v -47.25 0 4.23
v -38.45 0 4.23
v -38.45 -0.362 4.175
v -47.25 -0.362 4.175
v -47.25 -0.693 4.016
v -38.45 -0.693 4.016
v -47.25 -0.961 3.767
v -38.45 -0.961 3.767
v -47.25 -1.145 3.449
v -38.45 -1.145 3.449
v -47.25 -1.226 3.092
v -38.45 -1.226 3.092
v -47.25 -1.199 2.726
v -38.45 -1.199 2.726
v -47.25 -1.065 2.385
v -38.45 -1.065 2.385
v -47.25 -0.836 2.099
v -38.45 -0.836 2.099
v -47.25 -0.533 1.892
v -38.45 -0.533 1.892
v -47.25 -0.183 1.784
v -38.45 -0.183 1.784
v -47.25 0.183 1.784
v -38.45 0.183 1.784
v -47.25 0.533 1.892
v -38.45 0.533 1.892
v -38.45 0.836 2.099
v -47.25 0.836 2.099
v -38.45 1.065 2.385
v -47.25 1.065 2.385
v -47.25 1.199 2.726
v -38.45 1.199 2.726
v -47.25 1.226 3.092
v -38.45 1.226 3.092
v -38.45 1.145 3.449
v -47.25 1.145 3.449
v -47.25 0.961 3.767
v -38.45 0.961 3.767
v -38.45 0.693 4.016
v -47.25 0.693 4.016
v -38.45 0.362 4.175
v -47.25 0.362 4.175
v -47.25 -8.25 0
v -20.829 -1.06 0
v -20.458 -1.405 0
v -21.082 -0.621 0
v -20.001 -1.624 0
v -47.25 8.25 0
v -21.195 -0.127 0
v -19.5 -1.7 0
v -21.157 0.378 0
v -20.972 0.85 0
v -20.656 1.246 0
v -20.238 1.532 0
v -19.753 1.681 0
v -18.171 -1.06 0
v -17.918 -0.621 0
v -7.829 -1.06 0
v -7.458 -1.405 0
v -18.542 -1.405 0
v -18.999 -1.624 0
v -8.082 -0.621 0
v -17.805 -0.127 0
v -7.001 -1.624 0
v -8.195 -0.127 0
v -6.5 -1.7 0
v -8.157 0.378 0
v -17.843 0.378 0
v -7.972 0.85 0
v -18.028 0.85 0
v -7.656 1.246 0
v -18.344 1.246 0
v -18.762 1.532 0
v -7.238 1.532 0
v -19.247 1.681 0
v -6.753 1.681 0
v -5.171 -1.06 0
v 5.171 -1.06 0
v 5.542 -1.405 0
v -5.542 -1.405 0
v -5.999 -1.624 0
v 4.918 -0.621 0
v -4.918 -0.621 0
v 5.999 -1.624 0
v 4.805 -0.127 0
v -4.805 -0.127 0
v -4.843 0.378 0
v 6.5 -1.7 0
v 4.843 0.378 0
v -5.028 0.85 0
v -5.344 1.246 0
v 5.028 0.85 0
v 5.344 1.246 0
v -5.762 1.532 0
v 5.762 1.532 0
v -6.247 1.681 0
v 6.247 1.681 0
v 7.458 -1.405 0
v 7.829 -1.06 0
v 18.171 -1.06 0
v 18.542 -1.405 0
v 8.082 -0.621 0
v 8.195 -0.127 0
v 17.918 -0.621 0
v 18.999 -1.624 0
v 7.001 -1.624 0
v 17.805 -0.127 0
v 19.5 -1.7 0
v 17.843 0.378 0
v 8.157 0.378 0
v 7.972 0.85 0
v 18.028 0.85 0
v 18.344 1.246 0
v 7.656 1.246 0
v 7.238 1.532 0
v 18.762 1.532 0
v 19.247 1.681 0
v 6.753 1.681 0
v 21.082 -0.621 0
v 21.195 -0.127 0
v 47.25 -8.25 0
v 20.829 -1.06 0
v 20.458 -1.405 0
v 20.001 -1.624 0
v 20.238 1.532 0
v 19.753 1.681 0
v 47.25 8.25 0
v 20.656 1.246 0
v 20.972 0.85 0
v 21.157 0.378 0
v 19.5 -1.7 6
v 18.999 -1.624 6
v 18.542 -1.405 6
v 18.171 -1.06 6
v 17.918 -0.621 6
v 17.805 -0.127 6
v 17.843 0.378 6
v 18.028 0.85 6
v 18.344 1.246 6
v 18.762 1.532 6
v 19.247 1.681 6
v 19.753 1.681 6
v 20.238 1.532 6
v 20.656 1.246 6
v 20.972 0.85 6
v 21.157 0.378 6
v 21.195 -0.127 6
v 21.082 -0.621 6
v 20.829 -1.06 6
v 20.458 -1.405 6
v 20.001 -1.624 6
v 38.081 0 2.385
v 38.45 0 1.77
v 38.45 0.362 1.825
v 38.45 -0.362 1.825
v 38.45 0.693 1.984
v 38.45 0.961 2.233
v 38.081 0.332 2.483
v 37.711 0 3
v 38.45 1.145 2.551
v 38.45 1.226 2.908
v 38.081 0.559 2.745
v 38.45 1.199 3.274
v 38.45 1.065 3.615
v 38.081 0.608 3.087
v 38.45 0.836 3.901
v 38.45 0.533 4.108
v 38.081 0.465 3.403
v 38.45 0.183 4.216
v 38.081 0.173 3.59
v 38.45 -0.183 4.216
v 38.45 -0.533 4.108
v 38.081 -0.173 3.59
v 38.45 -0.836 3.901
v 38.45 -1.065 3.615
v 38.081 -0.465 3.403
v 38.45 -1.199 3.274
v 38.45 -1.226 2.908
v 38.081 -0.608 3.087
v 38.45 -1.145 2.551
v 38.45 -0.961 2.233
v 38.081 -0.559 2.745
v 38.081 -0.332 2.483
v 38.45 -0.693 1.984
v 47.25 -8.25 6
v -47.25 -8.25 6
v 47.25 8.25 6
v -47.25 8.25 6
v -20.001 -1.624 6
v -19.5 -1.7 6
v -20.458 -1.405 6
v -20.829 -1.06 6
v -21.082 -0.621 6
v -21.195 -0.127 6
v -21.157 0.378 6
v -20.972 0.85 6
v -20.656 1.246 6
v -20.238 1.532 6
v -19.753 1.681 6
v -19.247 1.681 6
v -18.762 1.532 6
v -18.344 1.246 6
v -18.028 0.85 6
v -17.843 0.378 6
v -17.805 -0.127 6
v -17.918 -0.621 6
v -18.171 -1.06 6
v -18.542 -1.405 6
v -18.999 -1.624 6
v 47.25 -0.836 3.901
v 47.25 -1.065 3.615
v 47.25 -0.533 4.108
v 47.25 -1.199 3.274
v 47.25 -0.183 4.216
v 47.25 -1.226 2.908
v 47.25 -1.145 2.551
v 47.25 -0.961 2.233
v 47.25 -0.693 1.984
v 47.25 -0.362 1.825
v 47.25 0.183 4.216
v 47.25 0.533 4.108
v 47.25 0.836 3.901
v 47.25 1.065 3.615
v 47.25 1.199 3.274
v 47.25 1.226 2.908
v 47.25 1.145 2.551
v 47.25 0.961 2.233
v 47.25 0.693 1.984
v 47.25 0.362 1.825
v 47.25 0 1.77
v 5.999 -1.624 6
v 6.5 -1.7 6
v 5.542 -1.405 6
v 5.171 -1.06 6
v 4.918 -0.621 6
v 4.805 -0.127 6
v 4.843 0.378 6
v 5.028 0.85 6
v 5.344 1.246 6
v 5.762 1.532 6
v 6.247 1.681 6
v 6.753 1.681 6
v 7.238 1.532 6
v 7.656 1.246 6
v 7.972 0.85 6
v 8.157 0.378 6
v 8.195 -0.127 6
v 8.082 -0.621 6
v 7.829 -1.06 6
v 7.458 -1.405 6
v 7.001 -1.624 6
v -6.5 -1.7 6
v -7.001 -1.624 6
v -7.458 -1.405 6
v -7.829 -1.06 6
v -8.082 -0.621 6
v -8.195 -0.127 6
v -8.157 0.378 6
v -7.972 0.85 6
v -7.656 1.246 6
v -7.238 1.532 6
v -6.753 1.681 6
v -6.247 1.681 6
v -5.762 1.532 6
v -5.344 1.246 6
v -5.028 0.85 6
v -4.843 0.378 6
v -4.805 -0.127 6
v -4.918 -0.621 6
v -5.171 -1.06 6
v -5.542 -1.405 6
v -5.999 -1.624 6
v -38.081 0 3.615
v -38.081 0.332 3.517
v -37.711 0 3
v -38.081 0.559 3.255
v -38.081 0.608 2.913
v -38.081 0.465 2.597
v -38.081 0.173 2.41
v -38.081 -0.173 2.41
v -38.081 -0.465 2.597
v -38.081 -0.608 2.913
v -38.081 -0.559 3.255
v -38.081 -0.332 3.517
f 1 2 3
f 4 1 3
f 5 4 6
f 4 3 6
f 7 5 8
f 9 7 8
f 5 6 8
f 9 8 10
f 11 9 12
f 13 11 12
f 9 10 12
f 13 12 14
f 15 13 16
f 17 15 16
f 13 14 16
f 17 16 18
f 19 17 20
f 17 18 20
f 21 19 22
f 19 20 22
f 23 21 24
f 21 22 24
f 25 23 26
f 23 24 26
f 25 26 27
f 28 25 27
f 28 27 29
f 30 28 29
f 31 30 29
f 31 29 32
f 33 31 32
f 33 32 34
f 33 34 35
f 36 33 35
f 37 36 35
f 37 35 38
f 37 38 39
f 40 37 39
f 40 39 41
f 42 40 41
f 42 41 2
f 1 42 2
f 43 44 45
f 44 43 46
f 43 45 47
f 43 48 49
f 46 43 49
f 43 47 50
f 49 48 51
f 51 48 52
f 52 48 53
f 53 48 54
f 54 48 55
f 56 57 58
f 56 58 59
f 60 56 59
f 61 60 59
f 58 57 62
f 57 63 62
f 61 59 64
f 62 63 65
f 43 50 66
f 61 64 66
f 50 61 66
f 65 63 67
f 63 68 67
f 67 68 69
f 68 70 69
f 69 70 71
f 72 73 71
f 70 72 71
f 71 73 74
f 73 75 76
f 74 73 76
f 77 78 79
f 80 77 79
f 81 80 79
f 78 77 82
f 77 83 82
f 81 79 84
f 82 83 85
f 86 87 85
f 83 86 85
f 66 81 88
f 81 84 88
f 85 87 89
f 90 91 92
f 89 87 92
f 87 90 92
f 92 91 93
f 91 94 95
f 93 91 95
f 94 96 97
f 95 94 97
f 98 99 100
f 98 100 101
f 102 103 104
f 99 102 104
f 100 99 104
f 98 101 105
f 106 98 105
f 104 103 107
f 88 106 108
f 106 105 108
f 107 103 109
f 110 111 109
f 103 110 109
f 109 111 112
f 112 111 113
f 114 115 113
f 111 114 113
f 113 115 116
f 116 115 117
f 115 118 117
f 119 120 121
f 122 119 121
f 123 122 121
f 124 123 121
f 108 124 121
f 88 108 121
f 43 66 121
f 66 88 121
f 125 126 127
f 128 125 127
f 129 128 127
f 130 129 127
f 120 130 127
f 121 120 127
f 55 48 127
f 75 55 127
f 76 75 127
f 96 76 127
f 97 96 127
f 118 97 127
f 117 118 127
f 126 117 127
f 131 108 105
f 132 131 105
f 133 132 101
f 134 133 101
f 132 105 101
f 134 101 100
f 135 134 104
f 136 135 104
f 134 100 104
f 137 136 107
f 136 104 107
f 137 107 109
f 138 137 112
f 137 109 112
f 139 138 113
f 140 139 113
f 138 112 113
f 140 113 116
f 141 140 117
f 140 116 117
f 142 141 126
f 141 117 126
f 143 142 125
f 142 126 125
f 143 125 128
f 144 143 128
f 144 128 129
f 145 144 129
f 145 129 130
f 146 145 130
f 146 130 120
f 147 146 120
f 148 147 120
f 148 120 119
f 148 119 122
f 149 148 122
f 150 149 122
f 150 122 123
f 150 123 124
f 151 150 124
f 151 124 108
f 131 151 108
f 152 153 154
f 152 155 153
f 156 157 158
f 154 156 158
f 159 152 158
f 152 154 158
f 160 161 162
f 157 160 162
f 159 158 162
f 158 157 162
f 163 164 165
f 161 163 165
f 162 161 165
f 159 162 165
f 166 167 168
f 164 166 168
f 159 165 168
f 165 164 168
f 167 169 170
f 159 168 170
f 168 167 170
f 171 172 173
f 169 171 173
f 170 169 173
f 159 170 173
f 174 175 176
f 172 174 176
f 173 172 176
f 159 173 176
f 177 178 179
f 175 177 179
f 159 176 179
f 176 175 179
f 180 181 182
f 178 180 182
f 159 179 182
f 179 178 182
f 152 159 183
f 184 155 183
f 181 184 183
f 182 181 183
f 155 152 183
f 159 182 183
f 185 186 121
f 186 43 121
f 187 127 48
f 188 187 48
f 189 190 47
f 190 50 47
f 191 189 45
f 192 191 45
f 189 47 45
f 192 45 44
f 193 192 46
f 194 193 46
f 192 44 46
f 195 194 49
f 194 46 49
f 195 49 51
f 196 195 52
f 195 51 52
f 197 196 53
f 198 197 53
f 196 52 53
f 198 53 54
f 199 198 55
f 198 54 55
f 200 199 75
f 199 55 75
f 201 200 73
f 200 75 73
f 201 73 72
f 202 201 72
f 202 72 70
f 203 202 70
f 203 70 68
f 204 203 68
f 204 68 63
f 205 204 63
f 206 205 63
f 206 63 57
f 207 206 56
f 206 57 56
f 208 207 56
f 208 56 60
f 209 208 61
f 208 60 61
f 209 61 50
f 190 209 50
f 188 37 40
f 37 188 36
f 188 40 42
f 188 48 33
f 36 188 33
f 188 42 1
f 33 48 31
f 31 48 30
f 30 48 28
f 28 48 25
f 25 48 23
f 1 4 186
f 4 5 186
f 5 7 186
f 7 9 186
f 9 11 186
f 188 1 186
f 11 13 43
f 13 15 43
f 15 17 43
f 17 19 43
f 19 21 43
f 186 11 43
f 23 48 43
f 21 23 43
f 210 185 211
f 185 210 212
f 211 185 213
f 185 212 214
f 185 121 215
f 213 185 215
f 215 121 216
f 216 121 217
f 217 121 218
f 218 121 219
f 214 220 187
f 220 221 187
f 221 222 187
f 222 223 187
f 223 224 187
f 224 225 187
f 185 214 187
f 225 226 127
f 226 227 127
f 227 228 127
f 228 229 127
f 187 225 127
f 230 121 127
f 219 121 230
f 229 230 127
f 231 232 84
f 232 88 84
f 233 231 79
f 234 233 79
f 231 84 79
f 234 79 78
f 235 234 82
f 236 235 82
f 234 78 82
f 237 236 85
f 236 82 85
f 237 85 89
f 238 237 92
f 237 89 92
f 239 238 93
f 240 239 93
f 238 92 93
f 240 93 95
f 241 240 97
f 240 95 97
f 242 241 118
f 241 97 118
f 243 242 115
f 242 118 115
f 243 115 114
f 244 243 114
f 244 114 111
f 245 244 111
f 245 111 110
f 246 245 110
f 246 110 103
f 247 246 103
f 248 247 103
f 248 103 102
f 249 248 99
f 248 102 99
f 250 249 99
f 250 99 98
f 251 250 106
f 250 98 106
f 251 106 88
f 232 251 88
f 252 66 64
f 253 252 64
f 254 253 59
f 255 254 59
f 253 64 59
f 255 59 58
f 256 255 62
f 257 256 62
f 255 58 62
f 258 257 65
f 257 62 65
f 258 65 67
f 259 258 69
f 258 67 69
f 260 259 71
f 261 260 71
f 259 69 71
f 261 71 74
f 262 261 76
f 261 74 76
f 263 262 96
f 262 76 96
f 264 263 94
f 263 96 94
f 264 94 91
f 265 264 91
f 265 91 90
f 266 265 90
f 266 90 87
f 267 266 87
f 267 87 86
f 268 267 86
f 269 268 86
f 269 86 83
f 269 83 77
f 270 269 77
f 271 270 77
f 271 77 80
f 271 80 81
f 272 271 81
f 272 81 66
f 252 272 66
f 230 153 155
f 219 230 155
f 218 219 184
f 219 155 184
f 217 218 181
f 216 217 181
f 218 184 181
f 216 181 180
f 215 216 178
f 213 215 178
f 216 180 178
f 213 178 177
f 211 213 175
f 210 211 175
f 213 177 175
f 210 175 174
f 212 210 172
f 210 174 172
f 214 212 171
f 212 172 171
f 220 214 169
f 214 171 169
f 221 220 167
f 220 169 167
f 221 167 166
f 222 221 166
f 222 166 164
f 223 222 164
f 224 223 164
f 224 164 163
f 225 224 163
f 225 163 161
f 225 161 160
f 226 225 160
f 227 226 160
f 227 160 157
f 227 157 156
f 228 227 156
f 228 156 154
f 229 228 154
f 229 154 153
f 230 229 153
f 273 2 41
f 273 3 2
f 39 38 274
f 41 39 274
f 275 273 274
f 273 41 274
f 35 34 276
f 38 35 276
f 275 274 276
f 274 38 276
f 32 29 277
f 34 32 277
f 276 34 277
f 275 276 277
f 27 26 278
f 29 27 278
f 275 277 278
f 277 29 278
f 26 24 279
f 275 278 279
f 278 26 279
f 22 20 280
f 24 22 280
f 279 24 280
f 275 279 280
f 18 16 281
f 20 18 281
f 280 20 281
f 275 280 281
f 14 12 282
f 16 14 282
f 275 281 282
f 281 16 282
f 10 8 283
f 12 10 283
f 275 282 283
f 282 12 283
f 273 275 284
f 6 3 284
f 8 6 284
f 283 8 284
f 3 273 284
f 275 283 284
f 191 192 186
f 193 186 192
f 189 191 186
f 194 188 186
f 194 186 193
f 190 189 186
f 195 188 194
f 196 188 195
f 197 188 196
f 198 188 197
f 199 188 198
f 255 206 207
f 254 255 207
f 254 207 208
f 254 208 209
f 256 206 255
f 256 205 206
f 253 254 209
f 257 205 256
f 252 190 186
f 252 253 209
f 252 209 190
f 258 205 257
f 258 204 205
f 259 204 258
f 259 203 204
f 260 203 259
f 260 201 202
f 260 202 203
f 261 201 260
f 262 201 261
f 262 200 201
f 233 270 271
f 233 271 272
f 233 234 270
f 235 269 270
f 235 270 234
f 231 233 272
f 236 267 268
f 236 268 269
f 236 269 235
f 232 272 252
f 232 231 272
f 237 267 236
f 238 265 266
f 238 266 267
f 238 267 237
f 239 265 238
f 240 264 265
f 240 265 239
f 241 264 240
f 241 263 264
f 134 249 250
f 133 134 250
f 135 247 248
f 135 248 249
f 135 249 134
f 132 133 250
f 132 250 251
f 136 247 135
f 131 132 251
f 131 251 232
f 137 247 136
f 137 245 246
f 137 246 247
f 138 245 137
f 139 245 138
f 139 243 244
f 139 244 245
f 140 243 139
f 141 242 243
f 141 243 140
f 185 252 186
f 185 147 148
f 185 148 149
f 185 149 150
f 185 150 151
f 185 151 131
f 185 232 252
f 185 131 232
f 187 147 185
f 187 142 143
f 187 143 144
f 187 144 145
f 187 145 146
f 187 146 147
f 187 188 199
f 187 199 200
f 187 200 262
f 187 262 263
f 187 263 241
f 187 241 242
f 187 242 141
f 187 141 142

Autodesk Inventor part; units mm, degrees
ref_plane "YZ Plane" through (0, 0, 0) normal (1, 0, 0) x (0, 1, 0)
ref_plane "XZ Plane" through (0, 0, 0) normal (0, 1, 0) x (-1, 0, 0)
ref_plane "XY Plane" through (0, 0, 0) normal (0, 0, 1) x (1, 0, 0)
sketch "Sketch1" plane through (0, 0, 0) normal (0, 0, 1) x (1, 0, 0)
  line L0 (-47.25, -8.25) -> (47.25, -8.25)
  line L1 (47.25, -8.25) -> (47.25, 8.25)
  line L2 (47.25, 8.25) -> (-47.25, 8.25)
  line L3 (-47.25, 8.25) -> (-47.25, -8.25)
  line L4 (-47.25, -8.25) -> (47.25, 8.25) construction
  line L5 (47.25, -8.25) -> (-47.25, 8.25) construction
  point P0 (0, 0)
  dimension "d0" = 94.5
  dimension "d1" = 16.5
extrude "Extrusion1" add sketch "Sketch1" along normal blind 6
sketch "Sketch2" plane through (0, 0, 6) normal (0, 0, 1) x (1, 0, 0)
  line L0 (-19.5, 0) -> (-6.5, 0) construction
  line L1 (6.5, 0) -> (-6.5, 0) construction
  line L2 (6.5, 0) -> (19.5, 0) construction
  point P0 (0, 0)
  point P1 (0, 0)
  dimension "d4" = 13
  dimension "d5" = 13
  dimension "d6" = 13
hole "Hole1" at (-19.5, 0, 6) at (-6.5, 0, 6) at (6.5, 0, 6) at (19.5, 0, 6) direction (0, 0, -1) diameter 3.4 depth 8 tip angle 118 clearance for "Countersunk Flat Head Screw DIN EN ISO 2009" size "M3" standard "DIN"
sketch "Sketch3" plane through (47.25, -8.25, 0) normal (1, 0, 0) x (0, 0, -1)
  line L0 (0, 0) -> (0, 16.5) projected
  point P0 (0, 8.25)
  point P1 (-3, 8.25)
  point P2 (0, 8.25)
  dimension "d14" = 3
hole "Hole2" at (47.25, 0, 3) direction (-1, 0, 0) diameter 2.459 depth 8.8 tip angle 118 thread size "M3x0.5" class "6H" standard "ISO Metric profile"
sketch "Sketch4" plane through (-47.25, -8.25, 0) normal (-1, 0, 0) x (0, 0, 1)
  line L0 (0, 16.5) -> (0, 0) projected
  point P0 (0, 8.25)
  point P1 (3, 8.25)
  point P2 (0, 8.25)
  dimension "d22" = 3
hole "Hole3" at (-47.25, 0, 3) direction (1, 0, 0) diameter 2.459 depth 8.8 tip angle 118 thread size "M3x0.5" class "6H" standard "ISO Metric profile"
properties part number "Kühkörper_GateTreiber" material "Aluminum 6061"
